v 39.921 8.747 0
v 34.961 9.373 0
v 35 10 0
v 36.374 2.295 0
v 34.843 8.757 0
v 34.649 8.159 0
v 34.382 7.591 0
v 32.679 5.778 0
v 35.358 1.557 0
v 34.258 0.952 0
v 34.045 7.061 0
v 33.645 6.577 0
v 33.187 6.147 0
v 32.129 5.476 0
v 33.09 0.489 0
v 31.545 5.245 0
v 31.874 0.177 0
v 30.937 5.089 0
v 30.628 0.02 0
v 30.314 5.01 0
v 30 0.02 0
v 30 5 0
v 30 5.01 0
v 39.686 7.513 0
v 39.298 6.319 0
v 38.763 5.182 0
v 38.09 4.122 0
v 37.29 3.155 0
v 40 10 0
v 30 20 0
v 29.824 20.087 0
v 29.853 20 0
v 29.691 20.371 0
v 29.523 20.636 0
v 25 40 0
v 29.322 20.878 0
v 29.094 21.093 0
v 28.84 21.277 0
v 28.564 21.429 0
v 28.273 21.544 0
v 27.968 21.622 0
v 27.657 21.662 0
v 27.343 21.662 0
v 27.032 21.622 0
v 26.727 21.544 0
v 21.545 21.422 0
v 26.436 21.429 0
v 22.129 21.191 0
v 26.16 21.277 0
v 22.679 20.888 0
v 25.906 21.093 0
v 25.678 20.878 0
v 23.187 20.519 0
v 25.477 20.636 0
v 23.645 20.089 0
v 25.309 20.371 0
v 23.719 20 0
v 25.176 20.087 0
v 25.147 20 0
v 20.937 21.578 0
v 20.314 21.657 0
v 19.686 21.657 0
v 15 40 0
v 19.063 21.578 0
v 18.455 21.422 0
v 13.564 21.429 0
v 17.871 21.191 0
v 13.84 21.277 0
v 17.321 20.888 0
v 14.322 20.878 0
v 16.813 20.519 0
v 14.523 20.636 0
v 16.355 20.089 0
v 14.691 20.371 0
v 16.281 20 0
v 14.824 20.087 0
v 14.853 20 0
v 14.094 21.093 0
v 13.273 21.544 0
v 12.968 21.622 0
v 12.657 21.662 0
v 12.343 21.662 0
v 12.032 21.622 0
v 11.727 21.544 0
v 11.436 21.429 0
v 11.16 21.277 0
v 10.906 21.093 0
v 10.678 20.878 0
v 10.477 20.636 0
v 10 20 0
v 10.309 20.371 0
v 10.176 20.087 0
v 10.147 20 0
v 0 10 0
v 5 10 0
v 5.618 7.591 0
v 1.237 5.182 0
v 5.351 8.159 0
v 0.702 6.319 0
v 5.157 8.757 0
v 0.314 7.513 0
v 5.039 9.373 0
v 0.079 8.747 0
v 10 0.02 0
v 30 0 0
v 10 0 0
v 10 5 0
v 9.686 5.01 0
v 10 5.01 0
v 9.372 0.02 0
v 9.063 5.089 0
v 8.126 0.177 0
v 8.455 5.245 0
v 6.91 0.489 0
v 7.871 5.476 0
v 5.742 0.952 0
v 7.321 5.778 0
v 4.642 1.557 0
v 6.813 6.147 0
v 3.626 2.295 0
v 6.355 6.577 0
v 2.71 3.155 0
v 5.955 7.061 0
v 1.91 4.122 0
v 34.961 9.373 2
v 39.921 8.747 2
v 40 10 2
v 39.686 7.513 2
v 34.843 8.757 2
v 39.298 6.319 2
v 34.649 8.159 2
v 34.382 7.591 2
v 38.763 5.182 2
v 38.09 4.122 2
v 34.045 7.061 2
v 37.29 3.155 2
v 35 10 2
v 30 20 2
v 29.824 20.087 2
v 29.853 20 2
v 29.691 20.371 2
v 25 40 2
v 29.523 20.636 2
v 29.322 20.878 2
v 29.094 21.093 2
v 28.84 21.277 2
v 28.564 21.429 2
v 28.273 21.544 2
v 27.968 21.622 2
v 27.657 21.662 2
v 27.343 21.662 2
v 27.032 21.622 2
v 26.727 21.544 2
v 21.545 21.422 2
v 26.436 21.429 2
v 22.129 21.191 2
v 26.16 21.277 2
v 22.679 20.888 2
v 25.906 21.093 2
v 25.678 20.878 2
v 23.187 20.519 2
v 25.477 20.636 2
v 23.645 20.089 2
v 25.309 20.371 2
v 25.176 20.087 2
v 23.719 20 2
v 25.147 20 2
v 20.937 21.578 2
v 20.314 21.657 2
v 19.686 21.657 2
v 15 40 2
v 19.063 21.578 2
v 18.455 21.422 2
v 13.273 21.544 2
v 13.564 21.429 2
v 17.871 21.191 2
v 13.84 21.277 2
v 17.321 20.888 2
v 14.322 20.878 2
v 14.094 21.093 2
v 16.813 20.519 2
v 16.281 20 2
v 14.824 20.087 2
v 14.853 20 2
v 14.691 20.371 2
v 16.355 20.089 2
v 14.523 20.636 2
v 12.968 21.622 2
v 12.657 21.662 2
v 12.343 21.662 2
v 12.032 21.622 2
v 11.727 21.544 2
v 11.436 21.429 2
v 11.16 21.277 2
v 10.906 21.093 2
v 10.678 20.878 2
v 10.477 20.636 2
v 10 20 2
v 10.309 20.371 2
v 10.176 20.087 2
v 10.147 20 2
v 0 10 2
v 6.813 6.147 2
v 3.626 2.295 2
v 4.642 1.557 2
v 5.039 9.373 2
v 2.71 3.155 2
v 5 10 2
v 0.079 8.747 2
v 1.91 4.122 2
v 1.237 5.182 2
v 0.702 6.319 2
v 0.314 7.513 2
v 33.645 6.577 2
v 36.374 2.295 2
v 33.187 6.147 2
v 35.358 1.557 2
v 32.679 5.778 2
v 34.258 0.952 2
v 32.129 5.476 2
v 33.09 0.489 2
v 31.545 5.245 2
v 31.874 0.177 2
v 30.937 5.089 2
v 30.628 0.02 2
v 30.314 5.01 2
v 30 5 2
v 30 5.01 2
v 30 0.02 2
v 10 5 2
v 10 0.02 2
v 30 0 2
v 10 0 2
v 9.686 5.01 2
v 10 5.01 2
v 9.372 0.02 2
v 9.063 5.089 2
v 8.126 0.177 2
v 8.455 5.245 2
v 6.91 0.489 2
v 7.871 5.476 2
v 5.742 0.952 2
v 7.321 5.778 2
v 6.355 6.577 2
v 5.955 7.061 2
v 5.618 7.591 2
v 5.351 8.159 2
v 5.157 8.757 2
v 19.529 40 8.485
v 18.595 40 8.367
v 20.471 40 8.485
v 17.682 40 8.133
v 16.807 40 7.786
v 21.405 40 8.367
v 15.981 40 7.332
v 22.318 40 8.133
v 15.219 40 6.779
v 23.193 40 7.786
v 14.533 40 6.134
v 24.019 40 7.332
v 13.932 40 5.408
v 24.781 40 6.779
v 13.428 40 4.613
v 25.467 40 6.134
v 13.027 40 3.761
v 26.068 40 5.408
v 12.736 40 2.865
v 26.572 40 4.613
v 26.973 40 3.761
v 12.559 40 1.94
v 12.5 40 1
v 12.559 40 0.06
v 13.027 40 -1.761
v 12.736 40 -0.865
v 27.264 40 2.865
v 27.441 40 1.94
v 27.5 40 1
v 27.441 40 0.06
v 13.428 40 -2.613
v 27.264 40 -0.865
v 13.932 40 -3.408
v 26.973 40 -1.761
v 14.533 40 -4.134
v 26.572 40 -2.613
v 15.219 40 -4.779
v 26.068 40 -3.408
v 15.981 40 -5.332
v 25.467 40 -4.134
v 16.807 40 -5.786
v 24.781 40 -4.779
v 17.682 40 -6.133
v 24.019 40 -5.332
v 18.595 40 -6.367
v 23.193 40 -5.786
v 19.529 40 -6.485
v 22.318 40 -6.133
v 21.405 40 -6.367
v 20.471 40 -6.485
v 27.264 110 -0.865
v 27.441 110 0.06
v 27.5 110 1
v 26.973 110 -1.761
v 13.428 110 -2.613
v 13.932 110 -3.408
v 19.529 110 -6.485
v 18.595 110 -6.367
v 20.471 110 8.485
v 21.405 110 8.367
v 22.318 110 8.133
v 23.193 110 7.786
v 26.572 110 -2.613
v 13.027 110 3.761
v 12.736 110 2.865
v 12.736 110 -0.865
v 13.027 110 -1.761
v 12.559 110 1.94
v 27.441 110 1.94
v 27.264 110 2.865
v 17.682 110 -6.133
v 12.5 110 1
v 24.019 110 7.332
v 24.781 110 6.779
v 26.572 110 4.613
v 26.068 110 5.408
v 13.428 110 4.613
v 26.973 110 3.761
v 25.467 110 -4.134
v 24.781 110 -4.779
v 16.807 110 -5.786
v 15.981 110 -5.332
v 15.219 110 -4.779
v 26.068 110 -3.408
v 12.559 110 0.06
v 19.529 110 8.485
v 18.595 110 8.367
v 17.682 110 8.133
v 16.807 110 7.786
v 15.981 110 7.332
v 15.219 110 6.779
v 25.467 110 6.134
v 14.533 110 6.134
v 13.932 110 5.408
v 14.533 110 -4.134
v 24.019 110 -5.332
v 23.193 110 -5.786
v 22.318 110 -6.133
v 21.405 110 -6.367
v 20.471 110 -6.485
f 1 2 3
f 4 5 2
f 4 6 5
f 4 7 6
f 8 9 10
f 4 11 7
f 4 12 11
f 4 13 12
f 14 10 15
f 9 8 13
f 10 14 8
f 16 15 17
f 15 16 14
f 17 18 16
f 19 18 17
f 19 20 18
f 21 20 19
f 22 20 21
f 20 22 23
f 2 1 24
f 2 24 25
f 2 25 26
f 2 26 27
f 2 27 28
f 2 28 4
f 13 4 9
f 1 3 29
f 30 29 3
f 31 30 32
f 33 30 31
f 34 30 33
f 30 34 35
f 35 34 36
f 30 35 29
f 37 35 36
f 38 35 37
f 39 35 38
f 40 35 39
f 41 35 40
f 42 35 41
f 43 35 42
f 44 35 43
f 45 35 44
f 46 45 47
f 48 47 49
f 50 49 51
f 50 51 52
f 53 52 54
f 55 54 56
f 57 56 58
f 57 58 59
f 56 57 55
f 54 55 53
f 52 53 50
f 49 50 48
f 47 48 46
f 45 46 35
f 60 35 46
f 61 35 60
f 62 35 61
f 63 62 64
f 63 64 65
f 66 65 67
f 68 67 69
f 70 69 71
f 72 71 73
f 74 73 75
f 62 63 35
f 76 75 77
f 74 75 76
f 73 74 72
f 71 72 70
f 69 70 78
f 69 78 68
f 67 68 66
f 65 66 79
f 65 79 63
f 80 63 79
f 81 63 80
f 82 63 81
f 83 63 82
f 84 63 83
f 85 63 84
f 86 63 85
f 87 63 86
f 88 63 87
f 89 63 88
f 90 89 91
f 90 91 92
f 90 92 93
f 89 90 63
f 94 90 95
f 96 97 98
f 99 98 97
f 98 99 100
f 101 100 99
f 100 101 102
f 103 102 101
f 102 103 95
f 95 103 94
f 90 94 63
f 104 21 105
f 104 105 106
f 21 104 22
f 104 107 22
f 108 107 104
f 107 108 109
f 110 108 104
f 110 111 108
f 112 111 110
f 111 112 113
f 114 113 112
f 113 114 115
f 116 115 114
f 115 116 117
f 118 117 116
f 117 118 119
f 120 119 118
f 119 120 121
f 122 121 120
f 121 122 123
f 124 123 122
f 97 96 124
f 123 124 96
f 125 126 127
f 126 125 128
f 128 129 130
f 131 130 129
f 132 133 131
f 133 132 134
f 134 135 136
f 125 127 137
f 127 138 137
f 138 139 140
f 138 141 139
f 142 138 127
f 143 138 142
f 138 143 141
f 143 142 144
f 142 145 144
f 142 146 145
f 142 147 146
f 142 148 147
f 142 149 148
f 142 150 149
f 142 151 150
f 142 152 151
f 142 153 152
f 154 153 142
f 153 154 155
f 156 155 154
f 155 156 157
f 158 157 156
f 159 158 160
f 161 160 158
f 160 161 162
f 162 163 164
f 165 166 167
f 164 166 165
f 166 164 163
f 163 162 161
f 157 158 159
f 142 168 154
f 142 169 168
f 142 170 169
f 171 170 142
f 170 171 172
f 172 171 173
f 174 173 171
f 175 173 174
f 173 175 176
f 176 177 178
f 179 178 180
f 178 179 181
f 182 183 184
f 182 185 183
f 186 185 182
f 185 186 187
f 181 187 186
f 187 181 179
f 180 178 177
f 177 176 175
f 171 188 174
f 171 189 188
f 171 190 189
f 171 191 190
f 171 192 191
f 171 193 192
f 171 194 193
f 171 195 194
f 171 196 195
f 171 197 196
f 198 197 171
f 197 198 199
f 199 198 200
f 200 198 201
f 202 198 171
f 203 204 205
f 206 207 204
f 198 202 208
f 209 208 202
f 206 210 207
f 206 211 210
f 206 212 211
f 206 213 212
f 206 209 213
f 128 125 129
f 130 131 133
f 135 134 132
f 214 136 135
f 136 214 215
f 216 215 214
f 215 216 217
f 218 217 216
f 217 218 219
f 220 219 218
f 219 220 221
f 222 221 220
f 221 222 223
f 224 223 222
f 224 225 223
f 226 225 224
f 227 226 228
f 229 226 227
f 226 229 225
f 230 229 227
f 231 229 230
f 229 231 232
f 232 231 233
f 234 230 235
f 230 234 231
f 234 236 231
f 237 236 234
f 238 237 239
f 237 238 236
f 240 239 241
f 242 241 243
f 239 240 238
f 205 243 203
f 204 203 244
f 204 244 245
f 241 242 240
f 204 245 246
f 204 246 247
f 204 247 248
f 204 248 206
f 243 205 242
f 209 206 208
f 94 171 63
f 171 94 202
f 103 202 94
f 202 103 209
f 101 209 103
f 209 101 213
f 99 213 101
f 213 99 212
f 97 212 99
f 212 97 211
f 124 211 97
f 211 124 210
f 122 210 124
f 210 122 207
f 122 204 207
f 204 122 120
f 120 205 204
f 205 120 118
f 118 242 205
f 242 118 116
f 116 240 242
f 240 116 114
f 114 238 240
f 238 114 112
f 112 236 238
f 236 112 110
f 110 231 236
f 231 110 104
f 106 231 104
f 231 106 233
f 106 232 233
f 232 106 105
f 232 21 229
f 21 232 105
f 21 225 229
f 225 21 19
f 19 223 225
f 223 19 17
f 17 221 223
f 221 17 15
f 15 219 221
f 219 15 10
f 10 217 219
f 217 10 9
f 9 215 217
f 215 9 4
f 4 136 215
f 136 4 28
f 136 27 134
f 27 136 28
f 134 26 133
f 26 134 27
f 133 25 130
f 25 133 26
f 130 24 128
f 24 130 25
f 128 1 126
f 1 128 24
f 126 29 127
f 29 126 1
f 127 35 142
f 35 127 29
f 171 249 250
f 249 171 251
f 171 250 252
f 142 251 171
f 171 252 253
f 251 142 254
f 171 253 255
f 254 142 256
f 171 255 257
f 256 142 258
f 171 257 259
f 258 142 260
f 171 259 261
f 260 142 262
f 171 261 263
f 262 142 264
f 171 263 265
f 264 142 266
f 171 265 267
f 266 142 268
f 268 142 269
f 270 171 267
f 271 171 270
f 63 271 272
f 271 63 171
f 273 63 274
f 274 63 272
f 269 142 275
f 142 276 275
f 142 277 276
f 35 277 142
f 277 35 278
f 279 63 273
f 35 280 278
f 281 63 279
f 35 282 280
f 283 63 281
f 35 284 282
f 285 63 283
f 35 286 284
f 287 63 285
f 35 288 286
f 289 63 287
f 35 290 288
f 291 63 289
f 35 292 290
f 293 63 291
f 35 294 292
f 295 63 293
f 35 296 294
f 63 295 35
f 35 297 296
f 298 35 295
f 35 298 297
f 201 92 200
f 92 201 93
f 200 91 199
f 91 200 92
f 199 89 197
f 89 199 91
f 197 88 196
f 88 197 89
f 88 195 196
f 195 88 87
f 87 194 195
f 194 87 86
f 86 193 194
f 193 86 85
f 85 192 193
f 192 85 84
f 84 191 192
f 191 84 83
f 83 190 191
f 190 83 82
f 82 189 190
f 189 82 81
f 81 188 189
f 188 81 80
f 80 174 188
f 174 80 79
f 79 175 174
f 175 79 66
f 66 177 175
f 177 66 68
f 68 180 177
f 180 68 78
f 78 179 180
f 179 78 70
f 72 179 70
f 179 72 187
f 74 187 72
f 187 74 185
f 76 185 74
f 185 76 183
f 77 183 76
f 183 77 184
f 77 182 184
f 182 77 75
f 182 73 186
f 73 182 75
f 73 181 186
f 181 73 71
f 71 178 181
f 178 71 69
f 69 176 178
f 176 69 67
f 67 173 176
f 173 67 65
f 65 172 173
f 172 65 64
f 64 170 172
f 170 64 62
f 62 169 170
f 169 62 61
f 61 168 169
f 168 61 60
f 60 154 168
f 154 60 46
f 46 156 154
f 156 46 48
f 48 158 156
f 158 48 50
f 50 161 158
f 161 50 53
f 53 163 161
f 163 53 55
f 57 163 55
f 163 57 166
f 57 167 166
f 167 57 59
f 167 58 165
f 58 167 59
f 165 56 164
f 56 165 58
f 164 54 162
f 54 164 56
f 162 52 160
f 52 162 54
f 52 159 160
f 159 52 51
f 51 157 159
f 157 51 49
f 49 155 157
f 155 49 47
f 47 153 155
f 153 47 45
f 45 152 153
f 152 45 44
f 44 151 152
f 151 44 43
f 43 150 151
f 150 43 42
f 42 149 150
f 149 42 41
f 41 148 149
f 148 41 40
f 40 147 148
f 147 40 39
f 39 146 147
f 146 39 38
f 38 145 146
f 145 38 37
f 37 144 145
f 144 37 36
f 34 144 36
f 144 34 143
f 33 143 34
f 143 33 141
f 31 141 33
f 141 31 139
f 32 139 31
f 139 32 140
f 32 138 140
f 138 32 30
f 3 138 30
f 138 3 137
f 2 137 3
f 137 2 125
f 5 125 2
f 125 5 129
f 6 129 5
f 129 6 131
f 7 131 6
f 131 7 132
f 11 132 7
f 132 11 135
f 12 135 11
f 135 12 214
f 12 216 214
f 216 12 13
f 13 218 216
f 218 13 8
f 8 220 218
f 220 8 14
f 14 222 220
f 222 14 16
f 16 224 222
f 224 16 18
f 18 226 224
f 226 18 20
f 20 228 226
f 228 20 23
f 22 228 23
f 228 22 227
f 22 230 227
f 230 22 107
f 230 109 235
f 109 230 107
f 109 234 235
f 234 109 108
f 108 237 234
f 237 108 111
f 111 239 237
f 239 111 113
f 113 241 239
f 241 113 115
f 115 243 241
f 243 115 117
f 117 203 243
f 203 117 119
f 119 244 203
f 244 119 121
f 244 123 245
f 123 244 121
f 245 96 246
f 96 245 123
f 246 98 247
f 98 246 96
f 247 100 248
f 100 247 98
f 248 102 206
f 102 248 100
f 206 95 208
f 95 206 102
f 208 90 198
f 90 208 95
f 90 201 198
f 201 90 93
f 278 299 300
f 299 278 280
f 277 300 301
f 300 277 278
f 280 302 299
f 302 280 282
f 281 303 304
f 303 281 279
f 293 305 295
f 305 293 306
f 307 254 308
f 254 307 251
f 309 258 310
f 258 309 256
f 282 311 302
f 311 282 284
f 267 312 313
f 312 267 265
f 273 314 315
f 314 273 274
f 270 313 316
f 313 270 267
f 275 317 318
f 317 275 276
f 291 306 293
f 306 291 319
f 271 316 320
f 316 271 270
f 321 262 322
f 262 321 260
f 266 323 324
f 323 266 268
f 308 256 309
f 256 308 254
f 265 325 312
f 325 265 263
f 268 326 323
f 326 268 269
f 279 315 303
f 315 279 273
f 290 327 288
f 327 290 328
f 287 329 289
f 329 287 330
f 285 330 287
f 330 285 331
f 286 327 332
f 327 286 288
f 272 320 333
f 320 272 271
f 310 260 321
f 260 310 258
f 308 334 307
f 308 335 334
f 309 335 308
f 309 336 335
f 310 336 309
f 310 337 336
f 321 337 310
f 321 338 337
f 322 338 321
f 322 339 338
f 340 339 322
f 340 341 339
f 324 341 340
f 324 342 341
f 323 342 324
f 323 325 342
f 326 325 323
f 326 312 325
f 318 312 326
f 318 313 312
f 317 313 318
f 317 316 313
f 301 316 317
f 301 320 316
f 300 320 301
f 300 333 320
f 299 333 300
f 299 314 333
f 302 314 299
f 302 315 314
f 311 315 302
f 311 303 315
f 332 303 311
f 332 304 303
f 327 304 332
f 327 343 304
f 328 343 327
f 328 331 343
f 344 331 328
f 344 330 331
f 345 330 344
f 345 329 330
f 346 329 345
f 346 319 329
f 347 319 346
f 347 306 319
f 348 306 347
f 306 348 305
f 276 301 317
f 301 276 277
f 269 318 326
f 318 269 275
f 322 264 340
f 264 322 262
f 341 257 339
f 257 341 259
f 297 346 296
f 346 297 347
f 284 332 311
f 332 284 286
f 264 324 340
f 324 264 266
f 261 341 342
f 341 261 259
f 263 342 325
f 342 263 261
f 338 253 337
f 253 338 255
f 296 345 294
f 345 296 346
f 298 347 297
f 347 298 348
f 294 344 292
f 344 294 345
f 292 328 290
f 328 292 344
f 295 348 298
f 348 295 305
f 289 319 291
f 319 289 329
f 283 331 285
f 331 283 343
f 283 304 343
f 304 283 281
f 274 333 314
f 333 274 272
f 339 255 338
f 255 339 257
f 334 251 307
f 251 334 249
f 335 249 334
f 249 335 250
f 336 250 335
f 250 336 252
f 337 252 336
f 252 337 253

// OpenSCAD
// [FL_INDEX: keywords="openscad, 3d_parametric, Customizable_bottle_opener, csg_solid" | COT="Parametric OpenSCAD design from 3DCodeverse"]
// Title: Customizable bottle opener

// Set the total width of the bottle opener
width = 40; //[30:50]
// Set the height of the opening
openingHeight = 15; //[5:30]
// Set the width of the openers frame
frameWidth = 5; //[3:10]
// Set the thickness of the frame of the opener
thickness = 2; //[2:10]
// Set the height of the neck of the opener
neckHeight = 20; //[15:30]
// Set the width of the neck of the opener
neckWidth = 10; //[5:15]
// Set the radius of the small cavity
smallPinCircle = 2.5; // 
// Set the height of the small cavity
smallPinLoc = 3; // 
// Set the radius of the big cavity
bigPinCircle = 5; //
// Set the height of the big cavity
bigPinLoc = 1.5; // 
// Set the radius of the grip
gripWidth = 7.5; // [5:15]
// Set the length of the grip
gripLength = 70; // [40:150]

/* [hidden] */

$fn = 50;

union()
{
	linear_extrude(height = thickness)
	union()
	{
		intersection()
		{
			difference()
			{
				translate([frameWidth*2,frameWidth*2,0])circle(frameWidth*2);
				translate([frameWidth*2,frameWidth*2,0])circle(frameWidth);
			}
			polygon(points = [ [0,0], [0, frameWidth*2], [frameWidth*2,frameWidth*2], [frameWidth*2,frameWidth], [frameWidth*2,0] ], paths = [[0,1,2,3,4]] );
		}
		polygon(points = [ [0,frameWidth*2], [frameWidth,frameWidth*2], [frameWidth*2,openingHeight+(frameWidth)], [frameWidth,openingHeight+(frameWidth)] ], paths = [[0,1,2,3]] );
		polygon(points = [ [frameWidth*2,0], [width-(frameWidth*2),0], [width-(frameWidth*2),frameWidth], [frameWidth*2,frameWidth] ], paths = [[0,1,2,3]] );
		intersection()
		{
			difference()
			{
				translate([width-frameWidth*2,frameWidth*2,0])circle(frameWidth*2);
				translate([width-frameWidth*2,frameWidth*2,0])circle(frameWidth);
			}
			polygon(points = [ [width,0], [width, frameWidth*2], [width-frameWidth*2,frameWidth*2], [width-frameWidth*2,frameWidth], [width-frameWidth*2,0] ], paths = [[0,1,2,3,4]] );
		}
		polygon(points = [ [width,frameWidth*2], [width-frameWidth,frameWidth*2], [width-frameWidth*2,openingHeight+(frameWidth)], [width-frameWidth,openingHeight+(frameWidth)] ], paths = [[0,1,2,3]] );
		difference()
		{
			polygon(points = [ [frameWidth,openingHeight+frameWidth], [width-frameWidth,openingHeight+frameWidth], [width/2+neckWidth/2,openingHeight+frameWidth+neckHeight], [width/2-neckWidth/2,openingHeight+frameWidth+neckHeight] ], paths = [[0,1,2,3]] );
			intersection()
			{
				translate([frameWidth*2+smallPinCircle,openingHeight+frameWidth-smallPinCircle/3,0])circle(smallPinCircle);
				polygon(points = [ [frameWidth,openingHeight+frameWidth], [width-frameWidth,openingHeight+frameWidth], [width/2+neckWidth/2,openingHeight+frameWidth+neckHeight], [width/2-neckWidth/2,openingHeight+frameWidth+neckHeight] ], paths = [[0,1,2,3]] );
			}
			intersection()
			{
				translate([width-frameWidth*2-smallPinCircle,openingHeight+frameWidth-smallPinCircle/smallPinLoc,0])circle(smallPinCircle);
				polygon(points = [ [frameWidth,openingHeight+frameWidth], [width-frameWidth,openingHeight+frameWidth], [width/2+neckWidth/2,openingHeight+frameWidth+neckHeight], [width/2-neckWidth/2,openingHeight+frameWidth+neckHeight] ], paths = [[0,1,2,3]] );
			}
			intersection()
			{
				translate([width/2,openingHeight+frameWidth-bigPinCircle/bigPinLoc,0])circle(bigPinCircle);
				polygon(points = [ [frameWidth,openingHeight+frameWidth], [width-frameWidth,openingHeight+frameWidth], [width/2+neckWidth/2,openingHeight+frameWidth+neckHeight], [width/2-neckWidth/2,openingHeight+frameWidth+neckHeight] ], paths = [[0,1,2,3]] );
			}
		}
	}
	translate([width/2,openingHeight+frameWidth+neckHeight,thickness/2])rotate(a=-90, v=[1,0,0])cylinder(h = gripLength, r = gripWidth);
}
